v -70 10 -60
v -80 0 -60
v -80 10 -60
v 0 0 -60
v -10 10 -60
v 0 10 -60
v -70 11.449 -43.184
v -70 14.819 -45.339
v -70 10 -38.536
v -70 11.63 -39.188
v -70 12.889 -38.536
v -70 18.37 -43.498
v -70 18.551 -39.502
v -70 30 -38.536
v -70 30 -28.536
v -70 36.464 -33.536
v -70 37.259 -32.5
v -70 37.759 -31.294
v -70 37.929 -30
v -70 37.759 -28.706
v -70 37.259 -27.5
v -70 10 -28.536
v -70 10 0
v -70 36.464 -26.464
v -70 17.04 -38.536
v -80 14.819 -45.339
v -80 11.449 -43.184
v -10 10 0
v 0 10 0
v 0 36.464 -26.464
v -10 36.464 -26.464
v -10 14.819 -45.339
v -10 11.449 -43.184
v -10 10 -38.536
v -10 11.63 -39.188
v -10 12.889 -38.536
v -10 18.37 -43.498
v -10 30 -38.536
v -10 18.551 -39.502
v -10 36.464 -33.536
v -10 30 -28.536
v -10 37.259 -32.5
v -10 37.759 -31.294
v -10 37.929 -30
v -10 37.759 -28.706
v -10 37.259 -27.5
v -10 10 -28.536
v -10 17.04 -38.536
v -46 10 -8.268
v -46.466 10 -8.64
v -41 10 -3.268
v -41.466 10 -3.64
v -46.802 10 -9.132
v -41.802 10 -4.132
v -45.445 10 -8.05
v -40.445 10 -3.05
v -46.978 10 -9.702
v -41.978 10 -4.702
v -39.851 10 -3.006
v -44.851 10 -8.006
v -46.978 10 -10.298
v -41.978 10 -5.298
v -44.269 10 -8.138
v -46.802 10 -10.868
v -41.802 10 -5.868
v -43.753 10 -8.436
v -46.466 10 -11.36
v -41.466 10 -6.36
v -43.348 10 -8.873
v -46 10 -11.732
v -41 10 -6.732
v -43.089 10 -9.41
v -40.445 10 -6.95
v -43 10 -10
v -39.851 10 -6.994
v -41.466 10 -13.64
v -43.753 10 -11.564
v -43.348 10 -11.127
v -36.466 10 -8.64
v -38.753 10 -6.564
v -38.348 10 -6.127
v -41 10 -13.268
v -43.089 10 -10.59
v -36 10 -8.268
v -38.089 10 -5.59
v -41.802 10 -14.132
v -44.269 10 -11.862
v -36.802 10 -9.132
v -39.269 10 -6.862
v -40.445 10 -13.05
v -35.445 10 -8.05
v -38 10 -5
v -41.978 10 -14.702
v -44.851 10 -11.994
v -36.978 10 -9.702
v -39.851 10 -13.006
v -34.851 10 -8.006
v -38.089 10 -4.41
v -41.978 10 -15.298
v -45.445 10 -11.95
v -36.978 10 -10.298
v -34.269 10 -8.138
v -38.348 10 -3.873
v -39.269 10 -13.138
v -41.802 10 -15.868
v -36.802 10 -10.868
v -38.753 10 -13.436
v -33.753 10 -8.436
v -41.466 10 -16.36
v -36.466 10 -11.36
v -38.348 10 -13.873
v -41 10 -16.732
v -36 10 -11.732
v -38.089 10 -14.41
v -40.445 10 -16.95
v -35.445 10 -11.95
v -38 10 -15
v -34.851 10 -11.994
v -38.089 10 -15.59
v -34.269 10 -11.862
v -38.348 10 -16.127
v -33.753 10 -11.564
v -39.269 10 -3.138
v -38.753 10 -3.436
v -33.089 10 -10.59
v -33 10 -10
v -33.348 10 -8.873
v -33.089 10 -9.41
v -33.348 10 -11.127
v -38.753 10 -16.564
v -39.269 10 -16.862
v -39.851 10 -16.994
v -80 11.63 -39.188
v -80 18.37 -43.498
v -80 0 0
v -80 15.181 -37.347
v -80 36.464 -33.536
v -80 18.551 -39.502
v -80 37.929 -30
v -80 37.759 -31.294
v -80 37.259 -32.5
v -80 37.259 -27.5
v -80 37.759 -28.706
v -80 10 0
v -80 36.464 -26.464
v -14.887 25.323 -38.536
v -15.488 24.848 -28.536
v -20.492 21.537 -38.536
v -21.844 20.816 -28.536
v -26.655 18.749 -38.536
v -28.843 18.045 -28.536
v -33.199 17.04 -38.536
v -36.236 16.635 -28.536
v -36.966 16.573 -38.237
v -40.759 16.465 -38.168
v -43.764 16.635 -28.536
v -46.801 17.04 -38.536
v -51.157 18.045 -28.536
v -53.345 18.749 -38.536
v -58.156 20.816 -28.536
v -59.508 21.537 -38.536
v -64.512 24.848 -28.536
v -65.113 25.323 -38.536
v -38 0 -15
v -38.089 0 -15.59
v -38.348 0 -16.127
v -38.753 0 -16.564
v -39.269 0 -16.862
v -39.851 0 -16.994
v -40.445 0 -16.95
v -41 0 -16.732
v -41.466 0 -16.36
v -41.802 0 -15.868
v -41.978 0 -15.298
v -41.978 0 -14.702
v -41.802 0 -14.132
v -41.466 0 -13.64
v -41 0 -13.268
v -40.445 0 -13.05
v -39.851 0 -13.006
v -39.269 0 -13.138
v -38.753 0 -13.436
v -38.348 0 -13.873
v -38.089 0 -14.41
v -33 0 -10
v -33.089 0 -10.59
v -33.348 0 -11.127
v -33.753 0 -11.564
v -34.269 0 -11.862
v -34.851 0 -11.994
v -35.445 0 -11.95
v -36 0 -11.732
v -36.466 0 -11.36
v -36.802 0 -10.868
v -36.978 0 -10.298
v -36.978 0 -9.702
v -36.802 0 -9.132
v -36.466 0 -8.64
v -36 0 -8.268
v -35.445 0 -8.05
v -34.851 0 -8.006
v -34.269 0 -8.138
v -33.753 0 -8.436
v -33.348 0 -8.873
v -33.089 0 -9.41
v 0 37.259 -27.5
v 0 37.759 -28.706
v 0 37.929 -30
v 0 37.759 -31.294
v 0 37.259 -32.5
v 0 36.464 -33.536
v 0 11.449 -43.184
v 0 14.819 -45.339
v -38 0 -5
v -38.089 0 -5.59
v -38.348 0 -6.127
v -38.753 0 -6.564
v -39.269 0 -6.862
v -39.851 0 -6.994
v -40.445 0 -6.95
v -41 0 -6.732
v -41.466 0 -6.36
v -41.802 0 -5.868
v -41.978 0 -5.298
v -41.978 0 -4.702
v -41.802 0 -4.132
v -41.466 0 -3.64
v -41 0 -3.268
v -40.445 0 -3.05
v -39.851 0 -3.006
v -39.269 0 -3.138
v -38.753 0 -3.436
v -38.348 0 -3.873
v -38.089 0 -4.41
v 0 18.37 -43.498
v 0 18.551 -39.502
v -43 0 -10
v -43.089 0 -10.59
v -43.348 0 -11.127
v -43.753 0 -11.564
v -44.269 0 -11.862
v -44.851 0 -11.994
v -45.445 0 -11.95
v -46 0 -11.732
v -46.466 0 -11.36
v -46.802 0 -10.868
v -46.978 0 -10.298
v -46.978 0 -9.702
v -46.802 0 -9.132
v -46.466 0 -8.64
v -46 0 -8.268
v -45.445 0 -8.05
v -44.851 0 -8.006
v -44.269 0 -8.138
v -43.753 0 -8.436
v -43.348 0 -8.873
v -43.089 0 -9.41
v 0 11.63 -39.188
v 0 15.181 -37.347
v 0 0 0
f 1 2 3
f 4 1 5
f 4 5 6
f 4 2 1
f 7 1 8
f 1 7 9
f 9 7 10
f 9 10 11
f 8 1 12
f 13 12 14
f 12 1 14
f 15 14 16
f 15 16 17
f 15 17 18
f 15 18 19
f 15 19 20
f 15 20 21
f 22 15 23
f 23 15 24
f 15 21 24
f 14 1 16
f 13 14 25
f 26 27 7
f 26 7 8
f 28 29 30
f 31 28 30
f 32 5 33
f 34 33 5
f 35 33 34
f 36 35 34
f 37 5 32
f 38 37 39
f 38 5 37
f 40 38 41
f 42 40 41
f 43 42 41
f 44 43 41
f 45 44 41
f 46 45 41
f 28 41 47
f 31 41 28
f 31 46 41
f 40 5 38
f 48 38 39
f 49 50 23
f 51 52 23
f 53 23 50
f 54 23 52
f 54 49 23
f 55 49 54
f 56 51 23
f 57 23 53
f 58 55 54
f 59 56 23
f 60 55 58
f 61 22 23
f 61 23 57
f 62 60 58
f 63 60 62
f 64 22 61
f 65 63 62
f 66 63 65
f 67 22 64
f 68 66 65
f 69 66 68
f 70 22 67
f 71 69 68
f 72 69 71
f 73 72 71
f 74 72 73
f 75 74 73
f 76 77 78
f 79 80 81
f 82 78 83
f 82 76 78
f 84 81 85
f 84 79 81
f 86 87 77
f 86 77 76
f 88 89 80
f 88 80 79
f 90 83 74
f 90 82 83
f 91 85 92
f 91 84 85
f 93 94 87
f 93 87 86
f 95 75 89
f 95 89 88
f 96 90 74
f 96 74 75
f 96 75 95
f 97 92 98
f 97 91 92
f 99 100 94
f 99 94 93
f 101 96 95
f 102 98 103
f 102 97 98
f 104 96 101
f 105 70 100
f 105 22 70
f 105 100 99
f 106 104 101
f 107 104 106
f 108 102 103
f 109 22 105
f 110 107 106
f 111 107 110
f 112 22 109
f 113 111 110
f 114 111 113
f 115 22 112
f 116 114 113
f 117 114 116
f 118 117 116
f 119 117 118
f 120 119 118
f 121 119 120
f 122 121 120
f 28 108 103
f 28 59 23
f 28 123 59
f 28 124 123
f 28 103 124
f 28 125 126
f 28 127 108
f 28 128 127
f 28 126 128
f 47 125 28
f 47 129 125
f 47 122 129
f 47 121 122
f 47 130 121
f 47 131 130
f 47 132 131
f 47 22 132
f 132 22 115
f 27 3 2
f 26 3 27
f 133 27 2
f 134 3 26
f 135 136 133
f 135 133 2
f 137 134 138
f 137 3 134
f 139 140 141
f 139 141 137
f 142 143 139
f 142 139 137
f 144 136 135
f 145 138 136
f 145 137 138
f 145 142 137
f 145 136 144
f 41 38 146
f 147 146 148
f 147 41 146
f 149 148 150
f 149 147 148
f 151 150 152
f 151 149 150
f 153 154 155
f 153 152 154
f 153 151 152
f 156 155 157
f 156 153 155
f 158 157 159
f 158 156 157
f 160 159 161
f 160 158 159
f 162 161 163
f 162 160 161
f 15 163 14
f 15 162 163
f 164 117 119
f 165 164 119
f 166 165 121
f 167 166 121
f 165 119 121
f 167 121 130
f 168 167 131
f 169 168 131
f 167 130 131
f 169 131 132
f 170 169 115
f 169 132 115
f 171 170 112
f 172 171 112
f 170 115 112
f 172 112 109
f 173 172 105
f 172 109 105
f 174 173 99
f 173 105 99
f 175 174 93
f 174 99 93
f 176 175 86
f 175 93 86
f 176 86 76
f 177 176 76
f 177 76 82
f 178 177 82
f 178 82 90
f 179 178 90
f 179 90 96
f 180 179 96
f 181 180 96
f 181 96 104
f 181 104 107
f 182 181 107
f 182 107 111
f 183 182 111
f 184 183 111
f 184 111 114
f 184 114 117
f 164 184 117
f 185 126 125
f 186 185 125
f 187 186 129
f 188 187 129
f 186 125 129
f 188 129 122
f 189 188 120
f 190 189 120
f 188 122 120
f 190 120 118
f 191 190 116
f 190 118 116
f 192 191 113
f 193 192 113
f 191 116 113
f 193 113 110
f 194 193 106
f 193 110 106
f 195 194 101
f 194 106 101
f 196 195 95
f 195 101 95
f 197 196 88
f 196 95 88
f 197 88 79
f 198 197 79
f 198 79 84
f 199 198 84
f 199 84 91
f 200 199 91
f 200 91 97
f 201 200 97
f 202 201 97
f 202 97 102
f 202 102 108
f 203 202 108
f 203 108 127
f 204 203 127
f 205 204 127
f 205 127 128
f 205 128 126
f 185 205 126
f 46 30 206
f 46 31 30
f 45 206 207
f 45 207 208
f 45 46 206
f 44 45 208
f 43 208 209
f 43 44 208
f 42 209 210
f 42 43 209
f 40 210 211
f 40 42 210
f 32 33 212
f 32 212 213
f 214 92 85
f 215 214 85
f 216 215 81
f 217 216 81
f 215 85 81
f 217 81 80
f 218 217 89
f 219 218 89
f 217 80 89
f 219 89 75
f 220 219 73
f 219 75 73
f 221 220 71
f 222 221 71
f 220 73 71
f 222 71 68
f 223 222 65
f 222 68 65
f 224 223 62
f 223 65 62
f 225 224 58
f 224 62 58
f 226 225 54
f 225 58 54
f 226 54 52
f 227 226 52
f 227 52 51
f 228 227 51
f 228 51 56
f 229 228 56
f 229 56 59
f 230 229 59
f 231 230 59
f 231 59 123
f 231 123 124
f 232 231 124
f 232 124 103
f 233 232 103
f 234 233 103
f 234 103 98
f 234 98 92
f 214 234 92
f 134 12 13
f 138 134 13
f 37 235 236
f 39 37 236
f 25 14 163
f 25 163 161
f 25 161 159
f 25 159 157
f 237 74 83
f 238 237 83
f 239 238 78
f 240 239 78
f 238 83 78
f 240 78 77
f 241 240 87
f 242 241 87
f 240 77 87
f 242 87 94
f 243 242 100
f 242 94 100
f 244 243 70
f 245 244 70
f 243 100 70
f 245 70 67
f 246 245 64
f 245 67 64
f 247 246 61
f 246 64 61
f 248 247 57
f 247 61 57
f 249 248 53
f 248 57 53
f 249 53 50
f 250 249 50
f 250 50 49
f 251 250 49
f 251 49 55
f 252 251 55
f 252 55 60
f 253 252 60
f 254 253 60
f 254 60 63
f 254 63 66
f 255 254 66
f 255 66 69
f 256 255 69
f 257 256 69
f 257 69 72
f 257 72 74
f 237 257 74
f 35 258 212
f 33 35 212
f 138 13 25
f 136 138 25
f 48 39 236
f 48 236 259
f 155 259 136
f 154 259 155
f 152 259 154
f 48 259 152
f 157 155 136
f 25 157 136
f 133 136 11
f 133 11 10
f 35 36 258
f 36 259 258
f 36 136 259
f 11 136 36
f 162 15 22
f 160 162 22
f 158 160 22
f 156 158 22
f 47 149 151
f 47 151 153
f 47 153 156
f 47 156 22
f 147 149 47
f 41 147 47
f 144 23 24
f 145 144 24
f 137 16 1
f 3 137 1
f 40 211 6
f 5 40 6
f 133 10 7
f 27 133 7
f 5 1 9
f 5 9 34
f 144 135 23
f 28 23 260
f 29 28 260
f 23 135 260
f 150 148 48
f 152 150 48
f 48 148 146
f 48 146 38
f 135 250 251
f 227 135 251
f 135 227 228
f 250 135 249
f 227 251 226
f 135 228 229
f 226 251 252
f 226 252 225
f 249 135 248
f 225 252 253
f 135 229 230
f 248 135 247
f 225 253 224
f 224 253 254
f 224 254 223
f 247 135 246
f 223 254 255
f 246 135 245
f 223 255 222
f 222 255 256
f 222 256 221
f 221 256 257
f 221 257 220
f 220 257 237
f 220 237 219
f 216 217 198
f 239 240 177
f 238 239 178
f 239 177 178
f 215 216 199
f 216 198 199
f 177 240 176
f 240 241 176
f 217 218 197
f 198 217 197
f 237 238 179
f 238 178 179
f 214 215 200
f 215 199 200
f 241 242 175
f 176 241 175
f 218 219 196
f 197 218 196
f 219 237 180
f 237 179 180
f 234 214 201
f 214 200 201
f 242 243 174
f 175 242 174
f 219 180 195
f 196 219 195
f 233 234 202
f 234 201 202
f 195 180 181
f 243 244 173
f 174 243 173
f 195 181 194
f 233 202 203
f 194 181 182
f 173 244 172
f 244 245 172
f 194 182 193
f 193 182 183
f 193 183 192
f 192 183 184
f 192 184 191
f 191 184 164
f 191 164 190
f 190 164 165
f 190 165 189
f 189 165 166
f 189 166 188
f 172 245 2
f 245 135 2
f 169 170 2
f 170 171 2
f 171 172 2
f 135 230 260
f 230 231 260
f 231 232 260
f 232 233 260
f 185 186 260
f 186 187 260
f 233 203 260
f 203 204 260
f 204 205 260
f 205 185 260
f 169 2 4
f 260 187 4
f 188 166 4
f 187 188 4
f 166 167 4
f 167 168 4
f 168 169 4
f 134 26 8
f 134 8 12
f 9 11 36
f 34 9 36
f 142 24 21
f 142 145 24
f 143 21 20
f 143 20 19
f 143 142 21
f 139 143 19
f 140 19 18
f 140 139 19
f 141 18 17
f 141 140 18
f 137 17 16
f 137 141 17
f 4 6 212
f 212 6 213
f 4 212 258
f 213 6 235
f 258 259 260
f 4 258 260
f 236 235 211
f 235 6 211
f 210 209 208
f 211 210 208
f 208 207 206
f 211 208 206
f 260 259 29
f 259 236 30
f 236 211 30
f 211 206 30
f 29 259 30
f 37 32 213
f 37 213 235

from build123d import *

# Parameters (mm, degrees)
SKETCH1_W           = 80
SKETCH1_H           = 60
BOSS_EXTRUDE1_DEPTH = 10
BOSS_EXTRUDE2_DEPTH = 10
LPATTERN2_COUNT     = 2
LPATTERN2_PITCH     = 70
FILLET1_R           = 5
BOSS_EXTRUDE3_START = -33.53553
BOSS_EXTRUDE3_DEPTH = 5
SKETCH4_R           = 2
CUT_EXTRUDE1_DEPTH  = 11
CUT_EXTRUDE2_DEPTH  = 81


with BuildPart() as part:
    # Sketch1 → Boss-Extrude1 (new body)
    with BuildSketch(Plane(origin=(0, 0, 0), x_dir=(1, 0, 0), z_dir=(0, 1, 0))):
        with Locations((-40, 30)):
            Rectangle(SKETCH1_W, SKETCH1_H)
    extrude(amount=BOSS_EXTRUDE1_DEPTH)

    # Sketch2 → Boss-Extrude2 (add)
    with BuildSketch(Plane(origin=(0, 0, 0), x_dir=(0, 0, -1), z_dir=(1, 0, 0))):
        Polygon((0, 10), (30, 40), (60, 10), align=None)
    boss_extrude2 = extrude(amount=-BOSS_EXTRUDE2_DEPTH)

    # LPattern2: Boss-Extrude2 ×2
    with Locations(*[(-i * LPATTERN2_PITCH, 0, 0) for i in range(1, LPATTERN2_COUNT)]):
        add(boss_extrude2)

    # Fillet1
    fillet1_edges = [part.edges().sort_by_distance(p)[0] for p in [
        (-5, 40, -30),
        (-75, 40, -30),
    ]]
    fillet(fillet1_edges, radius=FILLET1_R)

    # Sketch3 → Boss-Extrude3 (add, symmetric)
    with BuildSketch(Plane.XY.offset(BOSS_EXTRUDE3_START)):
        with BuildLine():
            Line((-70, 30), (-70, 10))
            Line((-70, 10), (-10, 10))
            Line((-10, 10), (-10, 30))
            ThreePointArc((-10, 30), (-40, 16.457513111), (-70, 30))
        make_face()
    extrude(amount=BOSS_EXTRUDE3_DEPTH, both=True)

    # Sketch4 → Cut-Extrude1 (cut, through all)
    with BuildSketch(Plane(origin=(0, 10, 0), x_dir=(1, 0, 0), z_dir=(0, 1, 0))):
        with Locations((-40, 15)):
            Circle(SKETCH4_R)
        with Locations((-35, 10)):
            Circle(SKETCH4_R)
        with Locations((-40, 5)):
            Circle(SKETCH4_R)
        with Locations((-45, 10)):
            Circle(SKETCH4_R)
    extrude(amount=-CUT_EXTRUDE1_DEPTH, mode=Mode.SUBTRACT)

    # Sketch5 → Cut-Extrude2 (cut, through all)
    with BuildSketch(Plane(origin=(0, 0, 0), x_dir=(0, 0, -1), z_dir=(1, 0, 0))):
        Polygon((43.184207347, 11.448981874), (45.338844925, 14.81907637), (43.497576267, 18.370094496), (39.501670032, 18.551018126), (37.347032454, 15.18092363), (39.188301112, 11.629905504), align=None)
    extrude(amount=-CUT_EXTRUDE2_DEPTH, mode=Mode.SUBTRACT)


solid = part.part
